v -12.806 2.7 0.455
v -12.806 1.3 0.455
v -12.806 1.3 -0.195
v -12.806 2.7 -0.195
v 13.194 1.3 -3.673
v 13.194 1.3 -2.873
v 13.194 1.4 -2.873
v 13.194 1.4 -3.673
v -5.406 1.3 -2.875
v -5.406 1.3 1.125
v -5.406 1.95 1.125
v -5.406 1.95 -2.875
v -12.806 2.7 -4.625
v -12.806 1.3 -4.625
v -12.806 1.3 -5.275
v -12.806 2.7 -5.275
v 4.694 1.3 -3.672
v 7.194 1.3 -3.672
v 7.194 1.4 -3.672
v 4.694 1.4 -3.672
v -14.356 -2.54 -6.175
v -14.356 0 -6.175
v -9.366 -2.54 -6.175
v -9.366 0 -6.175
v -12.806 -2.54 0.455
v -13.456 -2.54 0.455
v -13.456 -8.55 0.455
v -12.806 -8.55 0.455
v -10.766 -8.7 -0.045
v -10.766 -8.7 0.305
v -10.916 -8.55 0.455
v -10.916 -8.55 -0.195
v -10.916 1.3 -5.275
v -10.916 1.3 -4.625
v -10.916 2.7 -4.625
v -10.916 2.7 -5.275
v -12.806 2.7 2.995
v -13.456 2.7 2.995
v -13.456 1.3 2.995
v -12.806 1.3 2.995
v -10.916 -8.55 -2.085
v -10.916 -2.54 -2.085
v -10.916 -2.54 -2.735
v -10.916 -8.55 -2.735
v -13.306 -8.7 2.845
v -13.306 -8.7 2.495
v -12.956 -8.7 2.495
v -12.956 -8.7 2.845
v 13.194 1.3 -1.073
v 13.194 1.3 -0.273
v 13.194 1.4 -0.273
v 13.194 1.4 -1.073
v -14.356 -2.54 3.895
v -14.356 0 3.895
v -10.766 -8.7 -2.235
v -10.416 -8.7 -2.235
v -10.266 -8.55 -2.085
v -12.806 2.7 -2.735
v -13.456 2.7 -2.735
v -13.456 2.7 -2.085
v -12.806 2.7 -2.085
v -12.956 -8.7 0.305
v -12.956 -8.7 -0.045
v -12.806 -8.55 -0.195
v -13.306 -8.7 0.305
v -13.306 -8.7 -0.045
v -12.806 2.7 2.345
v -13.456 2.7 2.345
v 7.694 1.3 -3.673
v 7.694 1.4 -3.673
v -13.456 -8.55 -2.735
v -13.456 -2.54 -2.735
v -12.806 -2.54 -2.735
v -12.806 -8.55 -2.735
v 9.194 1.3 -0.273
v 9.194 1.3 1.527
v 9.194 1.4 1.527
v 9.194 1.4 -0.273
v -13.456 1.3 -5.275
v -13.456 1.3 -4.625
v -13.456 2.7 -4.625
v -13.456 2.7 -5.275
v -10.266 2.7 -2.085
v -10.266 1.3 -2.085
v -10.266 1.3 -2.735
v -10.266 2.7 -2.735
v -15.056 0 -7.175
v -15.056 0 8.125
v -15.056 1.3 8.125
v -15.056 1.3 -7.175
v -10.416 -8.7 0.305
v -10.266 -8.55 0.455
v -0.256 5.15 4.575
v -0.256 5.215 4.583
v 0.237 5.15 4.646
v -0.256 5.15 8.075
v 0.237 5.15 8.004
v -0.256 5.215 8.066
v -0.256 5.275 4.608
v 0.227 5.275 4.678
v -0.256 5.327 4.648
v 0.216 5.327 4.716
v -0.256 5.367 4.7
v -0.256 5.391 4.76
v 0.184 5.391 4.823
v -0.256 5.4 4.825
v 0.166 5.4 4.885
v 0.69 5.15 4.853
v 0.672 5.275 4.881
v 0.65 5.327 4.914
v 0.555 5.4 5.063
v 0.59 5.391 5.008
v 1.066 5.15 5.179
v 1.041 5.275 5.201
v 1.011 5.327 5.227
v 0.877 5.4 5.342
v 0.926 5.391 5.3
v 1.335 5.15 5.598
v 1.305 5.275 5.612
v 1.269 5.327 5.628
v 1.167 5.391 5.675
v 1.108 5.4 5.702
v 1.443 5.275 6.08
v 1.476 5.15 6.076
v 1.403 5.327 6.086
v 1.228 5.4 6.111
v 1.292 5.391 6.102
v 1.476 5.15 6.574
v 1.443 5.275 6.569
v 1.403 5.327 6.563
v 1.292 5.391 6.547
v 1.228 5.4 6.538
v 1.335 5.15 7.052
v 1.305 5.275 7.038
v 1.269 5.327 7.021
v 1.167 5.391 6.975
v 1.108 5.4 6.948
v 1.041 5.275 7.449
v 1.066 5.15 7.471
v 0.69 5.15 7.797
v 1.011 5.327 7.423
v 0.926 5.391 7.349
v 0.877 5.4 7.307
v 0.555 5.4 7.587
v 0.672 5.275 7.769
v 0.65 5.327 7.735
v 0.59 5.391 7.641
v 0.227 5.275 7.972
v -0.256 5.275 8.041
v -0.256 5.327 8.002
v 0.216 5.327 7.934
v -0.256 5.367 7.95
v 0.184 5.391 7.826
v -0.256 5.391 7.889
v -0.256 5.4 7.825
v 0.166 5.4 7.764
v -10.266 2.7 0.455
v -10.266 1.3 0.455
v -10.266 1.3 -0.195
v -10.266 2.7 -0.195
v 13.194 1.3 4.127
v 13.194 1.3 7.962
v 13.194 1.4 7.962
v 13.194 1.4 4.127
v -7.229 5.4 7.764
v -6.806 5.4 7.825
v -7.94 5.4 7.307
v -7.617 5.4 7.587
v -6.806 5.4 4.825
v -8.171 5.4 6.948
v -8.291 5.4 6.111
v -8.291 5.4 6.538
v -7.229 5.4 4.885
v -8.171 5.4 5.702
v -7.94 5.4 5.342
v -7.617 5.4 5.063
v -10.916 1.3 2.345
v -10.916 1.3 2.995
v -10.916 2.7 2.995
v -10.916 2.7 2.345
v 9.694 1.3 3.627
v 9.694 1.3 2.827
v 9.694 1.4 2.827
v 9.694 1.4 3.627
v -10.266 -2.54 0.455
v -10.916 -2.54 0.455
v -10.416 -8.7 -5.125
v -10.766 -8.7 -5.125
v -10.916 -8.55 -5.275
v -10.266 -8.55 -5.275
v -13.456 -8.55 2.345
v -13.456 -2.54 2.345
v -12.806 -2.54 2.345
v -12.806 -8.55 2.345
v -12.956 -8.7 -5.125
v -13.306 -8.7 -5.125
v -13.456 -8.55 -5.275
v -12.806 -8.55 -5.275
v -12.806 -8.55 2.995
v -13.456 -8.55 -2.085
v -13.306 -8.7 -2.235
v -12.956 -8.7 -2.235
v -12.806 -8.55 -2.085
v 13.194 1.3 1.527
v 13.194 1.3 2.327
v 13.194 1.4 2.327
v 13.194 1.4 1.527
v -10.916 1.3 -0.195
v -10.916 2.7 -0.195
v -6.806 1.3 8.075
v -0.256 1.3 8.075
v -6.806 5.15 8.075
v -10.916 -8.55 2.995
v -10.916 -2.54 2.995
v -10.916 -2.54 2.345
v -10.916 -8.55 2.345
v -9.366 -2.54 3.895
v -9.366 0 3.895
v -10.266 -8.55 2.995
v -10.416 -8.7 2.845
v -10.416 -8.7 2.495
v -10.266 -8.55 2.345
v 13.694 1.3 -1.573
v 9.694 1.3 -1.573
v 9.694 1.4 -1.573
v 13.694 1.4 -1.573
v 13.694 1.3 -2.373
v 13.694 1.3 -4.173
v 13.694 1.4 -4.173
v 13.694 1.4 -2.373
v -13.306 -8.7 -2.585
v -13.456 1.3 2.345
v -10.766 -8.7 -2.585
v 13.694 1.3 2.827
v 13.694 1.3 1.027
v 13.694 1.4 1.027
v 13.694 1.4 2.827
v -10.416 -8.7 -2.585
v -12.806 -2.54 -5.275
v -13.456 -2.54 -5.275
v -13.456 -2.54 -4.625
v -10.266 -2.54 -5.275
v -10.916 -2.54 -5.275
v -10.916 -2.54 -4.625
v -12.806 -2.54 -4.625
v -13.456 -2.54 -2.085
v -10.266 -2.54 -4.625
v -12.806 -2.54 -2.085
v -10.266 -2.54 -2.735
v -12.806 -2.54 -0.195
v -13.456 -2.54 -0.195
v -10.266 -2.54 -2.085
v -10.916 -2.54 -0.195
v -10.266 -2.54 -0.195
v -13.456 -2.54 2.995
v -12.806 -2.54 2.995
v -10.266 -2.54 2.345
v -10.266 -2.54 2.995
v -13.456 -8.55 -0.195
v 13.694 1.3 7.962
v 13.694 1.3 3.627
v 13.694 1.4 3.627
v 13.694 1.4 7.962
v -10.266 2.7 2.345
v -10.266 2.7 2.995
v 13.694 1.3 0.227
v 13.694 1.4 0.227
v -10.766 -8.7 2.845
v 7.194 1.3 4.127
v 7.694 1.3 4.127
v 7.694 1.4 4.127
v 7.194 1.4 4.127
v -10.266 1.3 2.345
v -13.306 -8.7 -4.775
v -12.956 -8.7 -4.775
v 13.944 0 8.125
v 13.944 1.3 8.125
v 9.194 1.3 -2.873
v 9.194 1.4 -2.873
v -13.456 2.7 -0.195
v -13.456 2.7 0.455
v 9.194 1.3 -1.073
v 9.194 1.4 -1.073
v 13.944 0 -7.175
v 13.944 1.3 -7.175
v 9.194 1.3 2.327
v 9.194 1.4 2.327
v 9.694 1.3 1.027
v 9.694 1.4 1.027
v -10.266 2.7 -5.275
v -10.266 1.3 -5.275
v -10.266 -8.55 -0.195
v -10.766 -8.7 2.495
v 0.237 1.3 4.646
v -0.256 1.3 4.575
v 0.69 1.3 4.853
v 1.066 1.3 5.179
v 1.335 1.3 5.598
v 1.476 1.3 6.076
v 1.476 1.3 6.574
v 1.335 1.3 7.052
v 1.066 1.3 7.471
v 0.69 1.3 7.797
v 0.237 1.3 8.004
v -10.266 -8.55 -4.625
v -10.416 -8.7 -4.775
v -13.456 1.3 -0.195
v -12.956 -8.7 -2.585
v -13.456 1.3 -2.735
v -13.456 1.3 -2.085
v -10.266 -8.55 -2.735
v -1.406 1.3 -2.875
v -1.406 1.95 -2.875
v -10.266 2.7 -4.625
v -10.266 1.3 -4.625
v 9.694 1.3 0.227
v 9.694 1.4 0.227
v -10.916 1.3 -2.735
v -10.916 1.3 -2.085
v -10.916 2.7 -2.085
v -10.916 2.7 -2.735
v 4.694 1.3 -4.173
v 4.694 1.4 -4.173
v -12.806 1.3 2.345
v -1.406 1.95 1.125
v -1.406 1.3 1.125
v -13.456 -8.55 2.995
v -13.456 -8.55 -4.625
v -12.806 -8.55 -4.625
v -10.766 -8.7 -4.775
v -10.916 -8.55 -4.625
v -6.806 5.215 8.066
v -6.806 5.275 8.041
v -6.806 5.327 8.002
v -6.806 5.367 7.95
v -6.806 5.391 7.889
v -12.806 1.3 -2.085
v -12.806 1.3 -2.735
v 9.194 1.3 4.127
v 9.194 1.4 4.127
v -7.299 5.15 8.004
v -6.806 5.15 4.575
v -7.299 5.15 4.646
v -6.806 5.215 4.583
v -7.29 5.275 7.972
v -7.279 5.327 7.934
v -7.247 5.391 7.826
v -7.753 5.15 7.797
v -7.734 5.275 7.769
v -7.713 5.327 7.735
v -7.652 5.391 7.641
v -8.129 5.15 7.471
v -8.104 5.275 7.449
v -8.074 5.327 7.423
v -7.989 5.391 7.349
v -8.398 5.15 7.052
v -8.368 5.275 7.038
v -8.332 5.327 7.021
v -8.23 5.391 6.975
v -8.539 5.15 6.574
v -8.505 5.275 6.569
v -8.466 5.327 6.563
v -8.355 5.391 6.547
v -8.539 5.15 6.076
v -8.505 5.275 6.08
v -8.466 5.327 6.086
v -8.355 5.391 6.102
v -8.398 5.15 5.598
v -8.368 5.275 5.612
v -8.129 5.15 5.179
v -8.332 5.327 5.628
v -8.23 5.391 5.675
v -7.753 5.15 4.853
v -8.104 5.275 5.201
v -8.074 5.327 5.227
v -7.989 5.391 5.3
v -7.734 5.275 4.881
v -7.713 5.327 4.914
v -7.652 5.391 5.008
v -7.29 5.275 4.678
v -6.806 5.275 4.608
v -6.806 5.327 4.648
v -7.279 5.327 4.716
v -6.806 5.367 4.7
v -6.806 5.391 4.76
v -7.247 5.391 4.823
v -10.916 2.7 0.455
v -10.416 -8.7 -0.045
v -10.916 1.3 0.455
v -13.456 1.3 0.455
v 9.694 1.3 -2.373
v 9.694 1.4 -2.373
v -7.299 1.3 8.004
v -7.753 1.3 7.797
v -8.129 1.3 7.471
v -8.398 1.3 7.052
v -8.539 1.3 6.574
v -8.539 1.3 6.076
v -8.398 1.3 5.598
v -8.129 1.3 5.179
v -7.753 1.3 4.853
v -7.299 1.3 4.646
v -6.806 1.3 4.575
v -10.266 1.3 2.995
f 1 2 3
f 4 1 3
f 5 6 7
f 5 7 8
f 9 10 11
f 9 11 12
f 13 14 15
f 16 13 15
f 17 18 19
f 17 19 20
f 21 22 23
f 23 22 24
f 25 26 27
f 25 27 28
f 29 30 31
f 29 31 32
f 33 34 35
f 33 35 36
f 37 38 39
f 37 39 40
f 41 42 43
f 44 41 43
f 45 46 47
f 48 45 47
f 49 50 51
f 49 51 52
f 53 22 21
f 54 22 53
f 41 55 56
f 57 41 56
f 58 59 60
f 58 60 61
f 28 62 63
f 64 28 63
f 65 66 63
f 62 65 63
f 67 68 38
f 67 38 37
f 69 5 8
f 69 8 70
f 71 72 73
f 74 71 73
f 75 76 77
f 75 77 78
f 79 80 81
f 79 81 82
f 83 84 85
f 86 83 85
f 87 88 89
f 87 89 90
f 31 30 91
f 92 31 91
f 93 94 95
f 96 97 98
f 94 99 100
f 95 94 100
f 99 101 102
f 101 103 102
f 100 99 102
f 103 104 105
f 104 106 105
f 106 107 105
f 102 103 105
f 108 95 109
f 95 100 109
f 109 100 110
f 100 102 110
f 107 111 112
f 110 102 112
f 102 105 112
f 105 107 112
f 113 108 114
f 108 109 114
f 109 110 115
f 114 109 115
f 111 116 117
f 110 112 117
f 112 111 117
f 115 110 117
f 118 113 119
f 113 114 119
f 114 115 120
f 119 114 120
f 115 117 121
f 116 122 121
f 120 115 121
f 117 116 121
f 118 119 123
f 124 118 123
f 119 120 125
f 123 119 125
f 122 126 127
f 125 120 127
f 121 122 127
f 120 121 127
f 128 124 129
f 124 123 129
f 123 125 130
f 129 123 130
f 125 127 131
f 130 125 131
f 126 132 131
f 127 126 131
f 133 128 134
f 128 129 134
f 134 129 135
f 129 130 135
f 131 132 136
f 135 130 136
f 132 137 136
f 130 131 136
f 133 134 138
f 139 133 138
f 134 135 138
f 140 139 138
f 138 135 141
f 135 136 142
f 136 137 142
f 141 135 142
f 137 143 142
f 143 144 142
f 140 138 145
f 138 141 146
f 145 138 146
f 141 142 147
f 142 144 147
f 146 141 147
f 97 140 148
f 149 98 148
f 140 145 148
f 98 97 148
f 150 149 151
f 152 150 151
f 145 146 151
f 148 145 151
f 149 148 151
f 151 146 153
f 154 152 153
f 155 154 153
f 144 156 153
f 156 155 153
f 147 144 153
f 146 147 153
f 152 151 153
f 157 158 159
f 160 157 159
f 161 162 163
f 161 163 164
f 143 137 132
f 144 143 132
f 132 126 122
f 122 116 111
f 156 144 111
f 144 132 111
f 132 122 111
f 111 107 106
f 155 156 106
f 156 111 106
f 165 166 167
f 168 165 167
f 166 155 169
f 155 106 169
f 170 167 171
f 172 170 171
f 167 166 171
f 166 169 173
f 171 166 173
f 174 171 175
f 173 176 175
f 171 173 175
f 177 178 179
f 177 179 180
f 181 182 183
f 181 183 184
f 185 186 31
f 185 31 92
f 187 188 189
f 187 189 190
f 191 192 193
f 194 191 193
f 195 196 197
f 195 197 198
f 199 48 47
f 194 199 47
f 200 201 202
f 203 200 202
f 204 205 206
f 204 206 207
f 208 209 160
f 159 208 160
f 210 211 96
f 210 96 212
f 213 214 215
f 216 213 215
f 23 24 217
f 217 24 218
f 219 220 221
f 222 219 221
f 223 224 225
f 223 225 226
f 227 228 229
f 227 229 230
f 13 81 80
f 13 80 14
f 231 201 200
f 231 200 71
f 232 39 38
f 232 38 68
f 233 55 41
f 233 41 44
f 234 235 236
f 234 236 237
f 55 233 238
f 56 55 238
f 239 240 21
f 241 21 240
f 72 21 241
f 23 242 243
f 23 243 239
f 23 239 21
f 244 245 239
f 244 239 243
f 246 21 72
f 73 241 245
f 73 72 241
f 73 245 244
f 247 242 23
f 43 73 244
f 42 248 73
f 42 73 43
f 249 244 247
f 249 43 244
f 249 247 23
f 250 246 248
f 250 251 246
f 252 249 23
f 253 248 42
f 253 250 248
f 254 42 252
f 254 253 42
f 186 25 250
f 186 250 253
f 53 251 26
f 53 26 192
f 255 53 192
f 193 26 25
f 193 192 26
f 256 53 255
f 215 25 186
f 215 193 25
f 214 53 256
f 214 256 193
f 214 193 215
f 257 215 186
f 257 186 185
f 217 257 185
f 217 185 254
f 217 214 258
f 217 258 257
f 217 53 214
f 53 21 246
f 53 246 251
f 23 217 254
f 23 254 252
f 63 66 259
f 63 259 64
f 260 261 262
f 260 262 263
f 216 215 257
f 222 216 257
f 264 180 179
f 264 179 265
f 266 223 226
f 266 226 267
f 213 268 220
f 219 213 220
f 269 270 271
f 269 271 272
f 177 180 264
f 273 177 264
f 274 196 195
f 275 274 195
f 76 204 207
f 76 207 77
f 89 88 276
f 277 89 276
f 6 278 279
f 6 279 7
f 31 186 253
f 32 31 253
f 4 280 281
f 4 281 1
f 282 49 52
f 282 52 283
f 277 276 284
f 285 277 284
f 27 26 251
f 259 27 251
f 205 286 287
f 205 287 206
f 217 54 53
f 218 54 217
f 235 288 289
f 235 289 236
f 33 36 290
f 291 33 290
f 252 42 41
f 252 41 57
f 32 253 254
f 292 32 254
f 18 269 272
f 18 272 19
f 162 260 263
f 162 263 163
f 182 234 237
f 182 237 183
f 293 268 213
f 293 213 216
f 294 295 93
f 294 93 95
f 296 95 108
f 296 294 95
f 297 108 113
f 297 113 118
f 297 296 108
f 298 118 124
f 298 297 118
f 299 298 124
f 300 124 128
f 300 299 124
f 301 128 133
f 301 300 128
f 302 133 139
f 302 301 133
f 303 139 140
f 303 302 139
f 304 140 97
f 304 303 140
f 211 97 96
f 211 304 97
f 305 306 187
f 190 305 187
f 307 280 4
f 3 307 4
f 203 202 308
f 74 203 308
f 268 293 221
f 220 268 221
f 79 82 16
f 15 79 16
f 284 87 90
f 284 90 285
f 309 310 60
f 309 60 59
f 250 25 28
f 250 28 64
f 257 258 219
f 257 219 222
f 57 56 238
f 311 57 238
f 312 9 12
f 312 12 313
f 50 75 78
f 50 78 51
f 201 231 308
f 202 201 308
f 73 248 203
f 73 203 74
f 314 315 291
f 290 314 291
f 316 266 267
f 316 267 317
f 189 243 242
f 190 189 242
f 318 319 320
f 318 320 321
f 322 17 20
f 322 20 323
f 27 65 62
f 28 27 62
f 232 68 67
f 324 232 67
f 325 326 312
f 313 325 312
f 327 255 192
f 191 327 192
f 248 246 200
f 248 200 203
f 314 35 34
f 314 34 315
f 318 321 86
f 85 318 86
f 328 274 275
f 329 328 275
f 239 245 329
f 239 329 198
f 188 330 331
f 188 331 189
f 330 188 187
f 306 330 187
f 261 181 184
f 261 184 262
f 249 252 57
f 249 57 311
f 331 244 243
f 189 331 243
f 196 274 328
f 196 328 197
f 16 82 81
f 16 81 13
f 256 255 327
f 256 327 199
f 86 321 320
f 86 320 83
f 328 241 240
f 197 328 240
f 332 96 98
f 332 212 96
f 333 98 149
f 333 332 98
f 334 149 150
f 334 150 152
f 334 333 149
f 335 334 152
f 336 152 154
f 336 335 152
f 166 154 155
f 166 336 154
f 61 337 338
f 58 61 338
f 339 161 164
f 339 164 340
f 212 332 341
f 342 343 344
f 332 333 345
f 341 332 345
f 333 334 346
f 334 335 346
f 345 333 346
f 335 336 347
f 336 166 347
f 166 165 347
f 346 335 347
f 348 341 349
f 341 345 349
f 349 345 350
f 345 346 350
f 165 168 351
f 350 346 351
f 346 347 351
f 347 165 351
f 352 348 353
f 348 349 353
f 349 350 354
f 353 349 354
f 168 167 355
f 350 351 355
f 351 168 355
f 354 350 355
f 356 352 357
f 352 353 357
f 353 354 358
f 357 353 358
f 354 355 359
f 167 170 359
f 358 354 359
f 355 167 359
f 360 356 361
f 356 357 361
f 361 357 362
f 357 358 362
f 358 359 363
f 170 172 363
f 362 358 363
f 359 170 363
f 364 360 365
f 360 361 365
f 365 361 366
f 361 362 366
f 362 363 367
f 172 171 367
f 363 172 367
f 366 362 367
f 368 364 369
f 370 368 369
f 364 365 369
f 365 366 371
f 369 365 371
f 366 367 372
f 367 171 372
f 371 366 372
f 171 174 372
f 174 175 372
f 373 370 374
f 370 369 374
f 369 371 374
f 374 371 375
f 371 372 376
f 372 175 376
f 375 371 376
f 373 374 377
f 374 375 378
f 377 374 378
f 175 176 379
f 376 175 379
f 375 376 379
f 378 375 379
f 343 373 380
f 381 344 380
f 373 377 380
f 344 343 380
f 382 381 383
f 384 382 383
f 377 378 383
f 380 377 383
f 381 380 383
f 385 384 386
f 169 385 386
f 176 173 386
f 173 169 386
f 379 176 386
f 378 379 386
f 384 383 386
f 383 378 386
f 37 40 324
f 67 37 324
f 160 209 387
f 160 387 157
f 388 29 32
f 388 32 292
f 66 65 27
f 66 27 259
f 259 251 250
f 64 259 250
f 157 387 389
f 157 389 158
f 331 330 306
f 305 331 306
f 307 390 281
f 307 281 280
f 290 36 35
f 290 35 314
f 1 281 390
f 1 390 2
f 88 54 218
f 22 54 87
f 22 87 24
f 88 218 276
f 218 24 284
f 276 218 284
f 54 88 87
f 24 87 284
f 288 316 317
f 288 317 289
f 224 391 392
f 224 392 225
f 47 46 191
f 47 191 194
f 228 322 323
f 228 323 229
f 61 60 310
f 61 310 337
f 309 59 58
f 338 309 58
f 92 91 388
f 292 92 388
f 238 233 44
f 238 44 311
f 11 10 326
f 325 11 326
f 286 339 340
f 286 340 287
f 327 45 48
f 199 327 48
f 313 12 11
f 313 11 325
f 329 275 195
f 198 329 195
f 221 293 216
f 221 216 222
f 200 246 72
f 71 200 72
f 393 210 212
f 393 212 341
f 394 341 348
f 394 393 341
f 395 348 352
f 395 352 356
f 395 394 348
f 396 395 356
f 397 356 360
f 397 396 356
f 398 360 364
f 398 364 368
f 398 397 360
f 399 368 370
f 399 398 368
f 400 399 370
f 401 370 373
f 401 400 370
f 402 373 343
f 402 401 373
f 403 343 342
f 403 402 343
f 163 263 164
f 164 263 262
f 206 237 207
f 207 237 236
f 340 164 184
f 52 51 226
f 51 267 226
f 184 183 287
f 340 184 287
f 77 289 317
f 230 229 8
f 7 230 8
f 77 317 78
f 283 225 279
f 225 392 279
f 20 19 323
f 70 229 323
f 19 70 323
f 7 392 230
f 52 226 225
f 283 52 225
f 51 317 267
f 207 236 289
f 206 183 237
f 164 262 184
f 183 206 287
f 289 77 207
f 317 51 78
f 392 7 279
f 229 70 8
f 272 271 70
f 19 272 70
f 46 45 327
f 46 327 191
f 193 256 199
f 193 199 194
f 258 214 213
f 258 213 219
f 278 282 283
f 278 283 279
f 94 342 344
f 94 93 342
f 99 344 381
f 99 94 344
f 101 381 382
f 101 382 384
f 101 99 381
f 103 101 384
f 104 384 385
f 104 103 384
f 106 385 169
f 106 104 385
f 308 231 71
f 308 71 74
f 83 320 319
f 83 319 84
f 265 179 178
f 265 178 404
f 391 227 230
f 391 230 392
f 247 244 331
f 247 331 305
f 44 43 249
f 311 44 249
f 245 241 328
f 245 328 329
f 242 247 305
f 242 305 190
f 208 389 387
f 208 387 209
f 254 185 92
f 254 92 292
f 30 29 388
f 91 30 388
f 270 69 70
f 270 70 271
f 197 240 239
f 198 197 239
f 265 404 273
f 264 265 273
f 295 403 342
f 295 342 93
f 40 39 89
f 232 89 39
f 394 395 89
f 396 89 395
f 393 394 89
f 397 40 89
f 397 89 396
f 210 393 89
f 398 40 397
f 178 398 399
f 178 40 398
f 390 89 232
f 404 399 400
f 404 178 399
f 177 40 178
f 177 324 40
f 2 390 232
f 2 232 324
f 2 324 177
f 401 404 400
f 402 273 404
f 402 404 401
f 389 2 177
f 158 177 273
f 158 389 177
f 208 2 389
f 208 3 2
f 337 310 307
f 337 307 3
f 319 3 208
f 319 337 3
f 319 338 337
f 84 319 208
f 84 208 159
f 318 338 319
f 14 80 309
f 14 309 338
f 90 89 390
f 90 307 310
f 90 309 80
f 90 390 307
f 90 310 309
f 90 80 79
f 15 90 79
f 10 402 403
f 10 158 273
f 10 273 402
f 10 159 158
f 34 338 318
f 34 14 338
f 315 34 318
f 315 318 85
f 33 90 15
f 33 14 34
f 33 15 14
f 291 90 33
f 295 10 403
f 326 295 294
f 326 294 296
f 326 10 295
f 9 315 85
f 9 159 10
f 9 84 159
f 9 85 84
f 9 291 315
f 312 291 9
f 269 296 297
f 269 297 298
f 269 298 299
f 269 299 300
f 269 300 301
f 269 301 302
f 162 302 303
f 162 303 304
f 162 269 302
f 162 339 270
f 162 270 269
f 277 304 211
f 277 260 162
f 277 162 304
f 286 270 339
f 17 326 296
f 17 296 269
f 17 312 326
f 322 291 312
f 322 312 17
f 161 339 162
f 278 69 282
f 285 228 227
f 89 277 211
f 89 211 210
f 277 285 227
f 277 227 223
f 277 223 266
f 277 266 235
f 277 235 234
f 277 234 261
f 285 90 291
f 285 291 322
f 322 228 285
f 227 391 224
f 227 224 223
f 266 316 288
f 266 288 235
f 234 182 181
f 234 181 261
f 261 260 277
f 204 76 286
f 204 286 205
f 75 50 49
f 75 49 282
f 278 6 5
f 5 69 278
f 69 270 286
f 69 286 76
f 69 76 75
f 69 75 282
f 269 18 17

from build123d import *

# Parameters (mm, degrees)
SKETCH1_W                = 29
SKETCH1_H                = 15.3
BOSS_EXTRUDE1_DEPTH      = 1.3
BOSS_EXTRUDE2_DEPTH      = 4.1
SKETCH3_W                = 0.65
SKETCH3_H                = 0.65
BOSS_EXTRUDE3_DEPTH      = 1.4
BOSS_EXTRUDE3_DEPTH_BACK = 10
SKETCH4_W                = 4.99
SKETCH4_H                = 10.07
BOSS_EXTRUDE4_DEPTH      = 2.54
SKETCH5_W                = 4
SKETCH5_H                = 4
BOSS_EXTRUDE5_DEPTH      = 0.65
FILLET1_R                = 0.25
CHAMFER1_SIZE            = 0.15
BOSS_EXTRUDE6_DEPTH      = 0.1


with BuildPart() as part:
    # Sketch1 → Boss-Extrude1 (new body)
    with BuildSketch(Plane(origin=(0, 0, 0), x_dir=(1, 0, 0), z_dir=(0, 1, 0))):
        with Locations((-0.556382979, -0.474734043)):
            Rectangle(SKETCH1_W, SKETCH1_H)
    extrude(amount=BOSS_EXTRUDE1_DEPTH)

    # Sketch2 → Boss-Extrude2 (add)
    with BuildSketch(Plane(origin=(0, 1.3, 0), x_dir=(1, 0, 0), z_dir=(0, 1, 0))):
        with BuildLine():
            Line((-6.806382979, -4.574734043), (-0.256382979, -4.574734043))
            ThreePointArc((-0.256382979, -4.574734043), (1.493617021, -6.324734043), (-0.256382979, -8.074734043))
            Line((-0.256382979, -8.074734043), (-6.806382979, -8.074734043))
            ThreePointArc((-6.806382979, -8.074734043), (-8.556382979, -6.324734043), (-6.806382979, -4.574734043))
        make_face()
    extrude(amount=BOSS_EXTRUDE2_DEPTH)

    # Sketch3 → Boss-Extrude3 (add, two sides)
    with BuildSketch(Plane(origin=(0, 1.3, 0), x_dir=(1, 0, 0), z_dir=(0, 1, 0))) as boss_extrude3_sk:
        with Locations((-13.131382979, 4.950265957)):
            Rectangle(SKETCH3_W, SKETCH3_H)
        with Locations((-10.591382979, 4.950265957)):
            Rectangle(SKETCH3_W, SKETCH3_H)
        with Locations((-10.591382979, 2.410265957)):
            Rectangle(SKETCH3_W, SKETCH3_H)
        with Locations((-10.591382979, -0.129734043)):
            Rectangle(SKETCH3_W, SKETCH3_H)
        with Locations((-10.591382979, -2.669734043)):
            Rectangle(SKETCH3_W, SKETCH3_H)
        with Locations((-13.131382979, 2.410265957)):
            Rectangle(SKETCH3_W, SKETCH3_H)
        with Locations((-13.131382979, -0.129734043)):
            Rectangle(SKETCH3_W, SKETCH3_H)
        with Locations((-13.131382979, -2.669734043)):
            Rectangle(SKETCH3_W, SKETCH3_H)
    extrude(amount=BOSS_EXTRUDE3_DEPTH)
    extrude(boss_extrude3_sk.sketch, amount=-BOSS_EXTRUDE3_DEPTH_BACK)

    # Sketch4 → Boss-Extrude4 (add)
    with BuildSketch(Plane.XZ):
        with Locations((-11.861382979, -1.140265957)):
            Rectangle(SKETCH4_W, SKETCH4_H)
    extrude(amount=BOSS_EXTRUDE4_DEPTH)

    # Sketch5 → Boss-Extrude5 (add)
    with BuildSketch(Plane(origin=(0, 1.3, 0), x_dir=(1, 0, 0), z_dir=(0, 1, 0))):
        with Locations((-3.406382979, 0.875265957)):
            Rectangle(SKETCH5_W, SKETCH5_H)
    extrude(amount=BOSS_EXTRUDE5_DEPTH)

    # Fillet1
    fillet1_edges = [part.edges().sort_by_distance(p)[0] for p in [
        (-8.556382979, 5.4, 6.324734043),
        (-3.531382979, 5.4, 8.074734043),
        (1.493617021, 5.4, 6.324734043),
        (-3.531382979, 5.4, 4.574734043),
    ]]
    fillet(fillet1_edges, radius=FILLET1_R)

    # Chamfer1
    chamfer1_edges = [part.edges().sort_by_distance(p)[0] for p in [
        (-10.591382979, -8.7, 2.344734043),
        (-10.266382979, -8.7, 2.669734043),
        (-10.591382979, -8.7, 2.994734043),
        (-10.916382979, -8.7, 2.669734043),
        (-13.131382979, -8.7, -2.735265957),
        (-12.806382979, -8.7, -2.410265957),
        (-13.131382979, -8.7, -2.085265957),
        (-13.456382979, -8.7, -2.410265957),
        (-13.131382979, -8.7, -0.195265957),
        (-12.806382979, -8.7, 0.129734043),
        (-13.131382979, -8.7, 0.454734043),
        (-13.456382979, -8.7, 0.129734043),
        (-13.131382979, -8.7, 2.344734043),
        (-12.806382979, -8.7, 2.669734043),
        (-13.131382979, -8.7, 2.994734043),
        (-13.456382979, -8.7, 2.669734043),
        (-13.456382979, -8.7, -4.950265957),
        (-13.131382979, -8.7, -5.275265957),
        (-12.806382979, -8.7, -4.950265957),
        (-13.131382979, -8.7, -4.625265957),
        (-10.591382979, -8.7, -5.275265957),
        (-10.266382979, -8.7, -4.950265957),
        (-10.591382979, -8.7, -4.625265957),
        (-10.916382979, -8.7, -4.950265957),
        (-10.591382979, -8.7, -2.735265957),
        (-10.266382979, -8.7, -2.410265957),
        (-10.591382979, -8.7, -2.085265957),
        (-10.916382979, -8.7, -2.410265957),
        (-10.591382979, -8.7, -0.195265957),
        (-10.266382979, -8.7, 0.129734043),
        (-10.591382979, -8.7, 0.454734043),
        (-10.916382979, -8.7, 0.129734043),
    ]]
    chamfer(chamfer1_edges, length=CHAMFER1_SIZE)

    # Sketch6 → Boss-Extrude6 (add)
    with BuildSketch(Plane(origin=(0, 1.3, 0), x_dir=(1, 0, 0), z_dir=(0, 1, 0))):
        Polygon((4.693617021, 4.173262585), (13.693617021, 4.173262585), (13.693617021, 2.373262585), (9.693617021, 2.373262585), (9.693617021, 1.573262585), (13.693617021, 1.573262585), (13.693617021, -0.226737415), (9.693617021, -0.226737415), (9.693617021, -1.026737415), (13.693617021, -1.026737415), (13.693617021, -2.826737415), (9.693617021, -2.826737415), (9.693617021, -3.626737415), (13.693617021, -3.626737415), (13.693617021, -7.962396389), (13.193617021, -7.962396389), (13.193617021, -4.126737415), (9.193617021, -4.126737415), (9.193617021, -2.326737415), (13.193617021, -2.326737415), (13.193617021, -1.526737415), (9.193617021, -1.526737415), (9.193617021, 0.273262585), (13.193617021, 0.273262585), (13.193617021, 1.073262585), (9.193617021, 1.073262585), (9.193617021, 2.873262585), (13.193617021, 2.873262585), (13.193617021, 3.673262585), (7.693617021, 3.673262585), (7.693617021, -4.126737415), (7.193617021, -4.126737415), (7.193617021, 3.671905646), (4.693617021, 3.671905646), align=None)
    extrude(amount=BOSS_EXTRUDE6_DEPTH)


solid = part.part
